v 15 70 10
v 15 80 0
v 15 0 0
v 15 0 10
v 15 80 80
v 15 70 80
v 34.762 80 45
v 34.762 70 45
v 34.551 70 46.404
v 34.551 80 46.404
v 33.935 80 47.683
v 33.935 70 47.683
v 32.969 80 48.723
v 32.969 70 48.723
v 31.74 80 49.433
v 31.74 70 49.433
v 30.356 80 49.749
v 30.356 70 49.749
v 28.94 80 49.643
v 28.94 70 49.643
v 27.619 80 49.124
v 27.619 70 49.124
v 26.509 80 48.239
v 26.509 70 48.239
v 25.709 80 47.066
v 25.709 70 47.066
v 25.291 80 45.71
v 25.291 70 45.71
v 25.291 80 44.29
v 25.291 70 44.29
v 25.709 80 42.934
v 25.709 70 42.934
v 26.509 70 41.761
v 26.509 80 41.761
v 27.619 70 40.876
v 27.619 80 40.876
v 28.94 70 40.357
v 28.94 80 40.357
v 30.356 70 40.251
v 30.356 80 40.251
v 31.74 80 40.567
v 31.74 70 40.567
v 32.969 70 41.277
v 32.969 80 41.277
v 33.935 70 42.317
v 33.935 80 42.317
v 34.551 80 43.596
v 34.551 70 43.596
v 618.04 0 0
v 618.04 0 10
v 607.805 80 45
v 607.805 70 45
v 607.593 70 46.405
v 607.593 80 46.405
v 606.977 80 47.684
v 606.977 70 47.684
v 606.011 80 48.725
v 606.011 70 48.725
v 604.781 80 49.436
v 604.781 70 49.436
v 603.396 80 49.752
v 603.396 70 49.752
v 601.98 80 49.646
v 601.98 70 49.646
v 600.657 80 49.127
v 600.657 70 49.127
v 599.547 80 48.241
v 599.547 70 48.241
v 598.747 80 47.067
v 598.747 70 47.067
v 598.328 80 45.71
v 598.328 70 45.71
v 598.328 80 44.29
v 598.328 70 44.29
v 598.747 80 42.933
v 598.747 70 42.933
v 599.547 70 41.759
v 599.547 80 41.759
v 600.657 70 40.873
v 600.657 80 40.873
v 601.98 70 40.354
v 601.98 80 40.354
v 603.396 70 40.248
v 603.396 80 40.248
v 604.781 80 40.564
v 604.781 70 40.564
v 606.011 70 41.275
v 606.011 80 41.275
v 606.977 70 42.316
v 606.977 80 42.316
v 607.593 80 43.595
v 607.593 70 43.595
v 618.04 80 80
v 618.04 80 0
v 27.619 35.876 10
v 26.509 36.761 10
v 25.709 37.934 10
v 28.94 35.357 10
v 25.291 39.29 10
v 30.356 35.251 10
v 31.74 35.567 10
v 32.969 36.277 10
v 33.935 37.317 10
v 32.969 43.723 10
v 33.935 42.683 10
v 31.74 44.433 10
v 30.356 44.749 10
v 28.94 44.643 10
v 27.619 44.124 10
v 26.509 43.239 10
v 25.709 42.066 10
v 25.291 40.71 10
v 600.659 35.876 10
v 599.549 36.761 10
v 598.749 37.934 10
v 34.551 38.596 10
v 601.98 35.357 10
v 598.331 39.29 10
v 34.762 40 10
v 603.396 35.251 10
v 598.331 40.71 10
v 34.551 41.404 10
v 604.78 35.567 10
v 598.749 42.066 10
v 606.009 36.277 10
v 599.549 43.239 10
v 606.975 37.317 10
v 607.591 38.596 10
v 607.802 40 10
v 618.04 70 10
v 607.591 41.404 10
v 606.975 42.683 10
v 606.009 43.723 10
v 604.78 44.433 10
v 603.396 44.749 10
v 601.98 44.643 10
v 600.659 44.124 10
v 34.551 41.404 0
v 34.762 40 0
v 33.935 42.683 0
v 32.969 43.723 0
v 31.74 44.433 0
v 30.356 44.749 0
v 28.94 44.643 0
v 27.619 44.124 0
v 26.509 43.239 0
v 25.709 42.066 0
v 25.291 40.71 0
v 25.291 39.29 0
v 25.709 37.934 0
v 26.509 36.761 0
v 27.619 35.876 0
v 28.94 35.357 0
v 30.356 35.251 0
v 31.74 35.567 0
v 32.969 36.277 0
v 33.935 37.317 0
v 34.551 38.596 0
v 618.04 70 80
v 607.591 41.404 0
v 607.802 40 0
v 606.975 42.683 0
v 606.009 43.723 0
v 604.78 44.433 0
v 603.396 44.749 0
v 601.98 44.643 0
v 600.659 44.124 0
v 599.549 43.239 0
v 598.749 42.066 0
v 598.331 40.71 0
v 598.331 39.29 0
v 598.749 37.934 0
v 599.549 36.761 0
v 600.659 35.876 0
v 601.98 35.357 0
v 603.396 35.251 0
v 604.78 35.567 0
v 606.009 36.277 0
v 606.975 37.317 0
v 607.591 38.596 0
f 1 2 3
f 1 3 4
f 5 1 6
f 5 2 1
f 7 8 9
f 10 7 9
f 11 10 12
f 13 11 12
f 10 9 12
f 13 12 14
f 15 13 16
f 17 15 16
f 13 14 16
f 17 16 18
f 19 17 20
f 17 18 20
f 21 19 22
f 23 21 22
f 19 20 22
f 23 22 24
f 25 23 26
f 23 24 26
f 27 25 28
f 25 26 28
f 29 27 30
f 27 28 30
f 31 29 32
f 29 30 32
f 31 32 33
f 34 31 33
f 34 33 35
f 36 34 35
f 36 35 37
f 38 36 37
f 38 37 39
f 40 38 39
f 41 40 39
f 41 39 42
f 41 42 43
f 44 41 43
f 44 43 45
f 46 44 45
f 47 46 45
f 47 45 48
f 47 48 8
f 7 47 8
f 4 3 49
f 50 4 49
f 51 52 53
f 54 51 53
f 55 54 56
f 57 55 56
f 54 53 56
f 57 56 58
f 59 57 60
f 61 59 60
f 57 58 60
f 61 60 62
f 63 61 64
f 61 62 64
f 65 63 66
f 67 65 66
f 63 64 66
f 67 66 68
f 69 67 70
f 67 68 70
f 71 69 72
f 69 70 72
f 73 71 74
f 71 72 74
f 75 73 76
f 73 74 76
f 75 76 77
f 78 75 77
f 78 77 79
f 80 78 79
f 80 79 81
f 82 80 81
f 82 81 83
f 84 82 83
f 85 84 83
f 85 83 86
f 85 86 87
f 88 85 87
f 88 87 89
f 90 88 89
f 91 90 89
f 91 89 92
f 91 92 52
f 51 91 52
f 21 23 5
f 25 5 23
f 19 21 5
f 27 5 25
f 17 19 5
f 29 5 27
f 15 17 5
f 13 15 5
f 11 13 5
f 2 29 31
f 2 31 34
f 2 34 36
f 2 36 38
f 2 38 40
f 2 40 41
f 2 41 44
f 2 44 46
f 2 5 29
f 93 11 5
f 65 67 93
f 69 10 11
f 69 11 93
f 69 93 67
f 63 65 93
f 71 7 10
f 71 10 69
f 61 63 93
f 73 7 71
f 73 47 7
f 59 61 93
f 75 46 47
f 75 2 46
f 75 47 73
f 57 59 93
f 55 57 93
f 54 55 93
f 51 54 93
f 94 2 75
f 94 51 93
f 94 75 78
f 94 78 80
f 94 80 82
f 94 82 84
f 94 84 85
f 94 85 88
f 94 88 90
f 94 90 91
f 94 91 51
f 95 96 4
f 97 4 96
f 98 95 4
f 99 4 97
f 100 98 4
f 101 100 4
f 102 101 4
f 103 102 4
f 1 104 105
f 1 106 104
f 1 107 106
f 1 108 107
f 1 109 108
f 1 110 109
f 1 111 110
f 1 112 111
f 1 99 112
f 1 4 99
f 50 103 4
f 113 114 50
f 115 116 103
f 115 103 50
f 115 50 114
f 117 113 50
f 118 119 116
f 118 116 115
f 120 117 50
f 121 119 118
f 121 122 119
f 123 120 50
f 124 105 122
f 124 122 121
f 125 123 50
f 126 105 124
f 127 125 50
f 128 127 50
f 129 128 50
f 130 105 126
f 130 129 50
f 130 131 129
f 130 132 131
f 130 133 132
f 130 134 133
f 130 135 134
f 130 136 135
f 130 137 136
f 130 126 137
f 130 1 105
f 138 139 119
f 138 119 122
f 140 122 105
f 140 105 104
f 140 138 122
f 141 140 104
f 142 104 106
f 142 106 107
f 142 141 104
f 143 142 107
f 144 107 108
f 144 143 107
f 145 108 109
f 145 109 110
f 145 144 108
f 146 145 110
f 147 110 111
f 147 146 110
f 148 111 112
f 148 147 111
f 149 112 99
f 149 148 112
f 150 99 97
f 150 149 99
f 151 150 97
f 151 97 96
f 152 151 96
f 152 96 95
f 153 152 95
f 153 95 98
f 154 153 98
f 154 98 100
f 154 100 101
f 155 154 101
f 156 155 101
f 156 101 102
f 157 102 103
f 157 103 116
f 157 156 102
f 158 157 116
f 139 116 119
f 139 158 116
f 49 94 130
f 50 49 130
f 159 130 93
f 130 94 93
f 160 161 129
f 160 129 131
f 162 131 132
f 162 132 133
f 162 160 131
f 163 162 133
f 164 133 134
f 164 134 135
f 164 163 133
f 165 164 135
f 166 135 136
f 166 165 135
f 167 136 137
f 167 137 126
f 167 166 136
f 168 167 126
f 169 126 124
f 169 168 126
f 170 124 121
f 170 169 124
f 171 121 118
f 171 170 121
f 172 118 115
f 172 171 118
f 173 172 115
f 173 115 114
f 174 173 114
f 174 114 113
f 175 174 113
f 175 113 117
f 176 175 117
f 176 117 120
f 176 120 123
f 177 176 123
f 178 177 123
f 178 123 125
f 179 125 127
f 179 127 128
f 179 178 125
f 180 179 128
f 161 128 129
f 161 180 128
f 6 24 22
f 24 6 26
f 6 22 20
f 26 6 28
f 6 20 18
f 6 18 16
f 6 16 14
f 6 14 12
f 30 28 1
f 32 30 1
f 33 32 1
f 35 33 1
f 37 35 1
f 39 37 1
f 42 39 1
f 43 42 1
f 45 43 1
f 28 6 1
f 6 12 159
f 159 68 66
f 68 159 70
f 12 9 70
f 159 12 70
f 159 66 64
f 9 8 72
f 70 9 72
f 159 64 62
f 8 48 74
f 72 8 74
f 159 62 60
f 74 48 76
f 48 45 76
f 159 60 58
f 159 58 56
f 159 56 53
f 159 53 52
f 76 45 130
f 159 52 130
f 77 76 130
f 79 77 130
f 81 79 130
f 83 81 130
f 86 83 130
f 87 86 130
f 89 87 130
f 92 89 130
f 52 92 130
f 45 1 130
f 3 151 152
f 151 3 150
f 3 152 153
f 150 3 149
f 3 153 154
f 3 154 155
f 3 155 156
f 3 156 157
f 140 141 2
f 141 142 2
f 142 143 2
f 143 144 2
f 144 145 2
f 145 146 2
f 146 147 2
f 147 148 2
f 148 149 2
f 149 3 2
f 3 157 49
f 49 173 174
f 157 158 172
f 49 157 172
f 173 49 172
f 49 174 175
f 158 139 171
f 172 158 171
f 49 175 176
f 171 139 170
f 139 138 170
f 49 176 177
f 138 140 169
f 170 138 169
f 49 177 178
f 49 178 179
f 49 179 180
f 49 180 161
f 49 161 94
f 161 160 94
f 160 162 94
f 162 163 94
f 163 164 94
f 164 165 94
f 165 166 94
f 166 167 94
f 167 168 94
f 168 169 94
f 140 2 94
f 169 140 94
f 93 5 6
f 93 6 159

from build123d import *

# Parameters (mm, degrees)
CROQUIS1_W              = 633.04
CROQUIS1_H              = 80
CROQUIS1_R              = 4.7625
SALIENTE_EXTRUIR1_DEPTH = 10
CROQUIS2_W              = 633.04
CROQUIS2_H              = 10
SALIENTE_EXTRUIR2_DEPTH = 70
CROQUIS3_R              = 4.7625
CROQUIS3_R_2            = 4.765
CORTAR_EXTRUIR1_DEPTH   = 642.903140357
CORTAR_EXTRUIR2_DEPTH   = 15
CORTAR_EXTRUIR3_DEPTH   = 15


with BuildPart() as part:
    # Croquis1 → Saliente-Extruir1 (new body)
    with BuildSketch(Plane.XY):
        with Locations((316.52, 40)):
            Rectangle(CROQUIS1_W, CROQUIS1_H)
        with Locations((30, 40)):
            Circle(CROQUIS1_R, mode=Mode.SUBTRACT)
        with Locations((603.04, 40)):
            Circle(CROQUIS1_R, mode=Mode.SUBTRACT)
    extrude(amount=SALIENTE_EXTRUIR1_DEPTH)

    # Croquis2 → Saliente-Extruir2 (add)
    with BuildSketch(Plane.XY.offset(10)):
        with Locations((316.52, 75)):
            Rectangle(CROQUIS2_W, CROQUIS2_H)
    extrude(amount=SALIENTE_EXTRUIR2_DEPTH)

    # Croquis3 → Cortar-Extruir1 (cut, through all)
    with BuildSketch(Plane.XZ.offset(-70)):
        with Locations((30, 45)):
            Circle(CROQUIS3_R)
        with Locations((603.04, 45)):
            Circle(CROQUIS3_R_2)
    extrude(amount=-CORTAR_EXTRUIR1_DEPTH, mode=Mode.SUBTRACT)

    # Croquis4 → Cortar-Extruir2 (cut)
    with BuildSketch(Plane(origin=(633.04, 0, 0), x_dir=(0, 0, -1), z_dir=(1, 0, 0))):
        Polygon((-80, 70), (-80, 80), (0, 80), (0, 0), (-10, 0), (-10, 70), align=None)
    extrude(amount=-CORTAR_EXTRUIR2_DEPTH, mode=Mode.SUBTRACT)

    # Croquis5 → Cortar-Extruir3 (cut)
    with BuildSketch(Plane.ZY):
        Polygon((80, 70), (80, 80), (0, 80), (0, 0), (10, 0), (10, 70), align=None)
    extrude(amount=-CORTAR_EXTRUIR3_DEPTH, mode=Mode.SUBTRACT)


solid = part.part
